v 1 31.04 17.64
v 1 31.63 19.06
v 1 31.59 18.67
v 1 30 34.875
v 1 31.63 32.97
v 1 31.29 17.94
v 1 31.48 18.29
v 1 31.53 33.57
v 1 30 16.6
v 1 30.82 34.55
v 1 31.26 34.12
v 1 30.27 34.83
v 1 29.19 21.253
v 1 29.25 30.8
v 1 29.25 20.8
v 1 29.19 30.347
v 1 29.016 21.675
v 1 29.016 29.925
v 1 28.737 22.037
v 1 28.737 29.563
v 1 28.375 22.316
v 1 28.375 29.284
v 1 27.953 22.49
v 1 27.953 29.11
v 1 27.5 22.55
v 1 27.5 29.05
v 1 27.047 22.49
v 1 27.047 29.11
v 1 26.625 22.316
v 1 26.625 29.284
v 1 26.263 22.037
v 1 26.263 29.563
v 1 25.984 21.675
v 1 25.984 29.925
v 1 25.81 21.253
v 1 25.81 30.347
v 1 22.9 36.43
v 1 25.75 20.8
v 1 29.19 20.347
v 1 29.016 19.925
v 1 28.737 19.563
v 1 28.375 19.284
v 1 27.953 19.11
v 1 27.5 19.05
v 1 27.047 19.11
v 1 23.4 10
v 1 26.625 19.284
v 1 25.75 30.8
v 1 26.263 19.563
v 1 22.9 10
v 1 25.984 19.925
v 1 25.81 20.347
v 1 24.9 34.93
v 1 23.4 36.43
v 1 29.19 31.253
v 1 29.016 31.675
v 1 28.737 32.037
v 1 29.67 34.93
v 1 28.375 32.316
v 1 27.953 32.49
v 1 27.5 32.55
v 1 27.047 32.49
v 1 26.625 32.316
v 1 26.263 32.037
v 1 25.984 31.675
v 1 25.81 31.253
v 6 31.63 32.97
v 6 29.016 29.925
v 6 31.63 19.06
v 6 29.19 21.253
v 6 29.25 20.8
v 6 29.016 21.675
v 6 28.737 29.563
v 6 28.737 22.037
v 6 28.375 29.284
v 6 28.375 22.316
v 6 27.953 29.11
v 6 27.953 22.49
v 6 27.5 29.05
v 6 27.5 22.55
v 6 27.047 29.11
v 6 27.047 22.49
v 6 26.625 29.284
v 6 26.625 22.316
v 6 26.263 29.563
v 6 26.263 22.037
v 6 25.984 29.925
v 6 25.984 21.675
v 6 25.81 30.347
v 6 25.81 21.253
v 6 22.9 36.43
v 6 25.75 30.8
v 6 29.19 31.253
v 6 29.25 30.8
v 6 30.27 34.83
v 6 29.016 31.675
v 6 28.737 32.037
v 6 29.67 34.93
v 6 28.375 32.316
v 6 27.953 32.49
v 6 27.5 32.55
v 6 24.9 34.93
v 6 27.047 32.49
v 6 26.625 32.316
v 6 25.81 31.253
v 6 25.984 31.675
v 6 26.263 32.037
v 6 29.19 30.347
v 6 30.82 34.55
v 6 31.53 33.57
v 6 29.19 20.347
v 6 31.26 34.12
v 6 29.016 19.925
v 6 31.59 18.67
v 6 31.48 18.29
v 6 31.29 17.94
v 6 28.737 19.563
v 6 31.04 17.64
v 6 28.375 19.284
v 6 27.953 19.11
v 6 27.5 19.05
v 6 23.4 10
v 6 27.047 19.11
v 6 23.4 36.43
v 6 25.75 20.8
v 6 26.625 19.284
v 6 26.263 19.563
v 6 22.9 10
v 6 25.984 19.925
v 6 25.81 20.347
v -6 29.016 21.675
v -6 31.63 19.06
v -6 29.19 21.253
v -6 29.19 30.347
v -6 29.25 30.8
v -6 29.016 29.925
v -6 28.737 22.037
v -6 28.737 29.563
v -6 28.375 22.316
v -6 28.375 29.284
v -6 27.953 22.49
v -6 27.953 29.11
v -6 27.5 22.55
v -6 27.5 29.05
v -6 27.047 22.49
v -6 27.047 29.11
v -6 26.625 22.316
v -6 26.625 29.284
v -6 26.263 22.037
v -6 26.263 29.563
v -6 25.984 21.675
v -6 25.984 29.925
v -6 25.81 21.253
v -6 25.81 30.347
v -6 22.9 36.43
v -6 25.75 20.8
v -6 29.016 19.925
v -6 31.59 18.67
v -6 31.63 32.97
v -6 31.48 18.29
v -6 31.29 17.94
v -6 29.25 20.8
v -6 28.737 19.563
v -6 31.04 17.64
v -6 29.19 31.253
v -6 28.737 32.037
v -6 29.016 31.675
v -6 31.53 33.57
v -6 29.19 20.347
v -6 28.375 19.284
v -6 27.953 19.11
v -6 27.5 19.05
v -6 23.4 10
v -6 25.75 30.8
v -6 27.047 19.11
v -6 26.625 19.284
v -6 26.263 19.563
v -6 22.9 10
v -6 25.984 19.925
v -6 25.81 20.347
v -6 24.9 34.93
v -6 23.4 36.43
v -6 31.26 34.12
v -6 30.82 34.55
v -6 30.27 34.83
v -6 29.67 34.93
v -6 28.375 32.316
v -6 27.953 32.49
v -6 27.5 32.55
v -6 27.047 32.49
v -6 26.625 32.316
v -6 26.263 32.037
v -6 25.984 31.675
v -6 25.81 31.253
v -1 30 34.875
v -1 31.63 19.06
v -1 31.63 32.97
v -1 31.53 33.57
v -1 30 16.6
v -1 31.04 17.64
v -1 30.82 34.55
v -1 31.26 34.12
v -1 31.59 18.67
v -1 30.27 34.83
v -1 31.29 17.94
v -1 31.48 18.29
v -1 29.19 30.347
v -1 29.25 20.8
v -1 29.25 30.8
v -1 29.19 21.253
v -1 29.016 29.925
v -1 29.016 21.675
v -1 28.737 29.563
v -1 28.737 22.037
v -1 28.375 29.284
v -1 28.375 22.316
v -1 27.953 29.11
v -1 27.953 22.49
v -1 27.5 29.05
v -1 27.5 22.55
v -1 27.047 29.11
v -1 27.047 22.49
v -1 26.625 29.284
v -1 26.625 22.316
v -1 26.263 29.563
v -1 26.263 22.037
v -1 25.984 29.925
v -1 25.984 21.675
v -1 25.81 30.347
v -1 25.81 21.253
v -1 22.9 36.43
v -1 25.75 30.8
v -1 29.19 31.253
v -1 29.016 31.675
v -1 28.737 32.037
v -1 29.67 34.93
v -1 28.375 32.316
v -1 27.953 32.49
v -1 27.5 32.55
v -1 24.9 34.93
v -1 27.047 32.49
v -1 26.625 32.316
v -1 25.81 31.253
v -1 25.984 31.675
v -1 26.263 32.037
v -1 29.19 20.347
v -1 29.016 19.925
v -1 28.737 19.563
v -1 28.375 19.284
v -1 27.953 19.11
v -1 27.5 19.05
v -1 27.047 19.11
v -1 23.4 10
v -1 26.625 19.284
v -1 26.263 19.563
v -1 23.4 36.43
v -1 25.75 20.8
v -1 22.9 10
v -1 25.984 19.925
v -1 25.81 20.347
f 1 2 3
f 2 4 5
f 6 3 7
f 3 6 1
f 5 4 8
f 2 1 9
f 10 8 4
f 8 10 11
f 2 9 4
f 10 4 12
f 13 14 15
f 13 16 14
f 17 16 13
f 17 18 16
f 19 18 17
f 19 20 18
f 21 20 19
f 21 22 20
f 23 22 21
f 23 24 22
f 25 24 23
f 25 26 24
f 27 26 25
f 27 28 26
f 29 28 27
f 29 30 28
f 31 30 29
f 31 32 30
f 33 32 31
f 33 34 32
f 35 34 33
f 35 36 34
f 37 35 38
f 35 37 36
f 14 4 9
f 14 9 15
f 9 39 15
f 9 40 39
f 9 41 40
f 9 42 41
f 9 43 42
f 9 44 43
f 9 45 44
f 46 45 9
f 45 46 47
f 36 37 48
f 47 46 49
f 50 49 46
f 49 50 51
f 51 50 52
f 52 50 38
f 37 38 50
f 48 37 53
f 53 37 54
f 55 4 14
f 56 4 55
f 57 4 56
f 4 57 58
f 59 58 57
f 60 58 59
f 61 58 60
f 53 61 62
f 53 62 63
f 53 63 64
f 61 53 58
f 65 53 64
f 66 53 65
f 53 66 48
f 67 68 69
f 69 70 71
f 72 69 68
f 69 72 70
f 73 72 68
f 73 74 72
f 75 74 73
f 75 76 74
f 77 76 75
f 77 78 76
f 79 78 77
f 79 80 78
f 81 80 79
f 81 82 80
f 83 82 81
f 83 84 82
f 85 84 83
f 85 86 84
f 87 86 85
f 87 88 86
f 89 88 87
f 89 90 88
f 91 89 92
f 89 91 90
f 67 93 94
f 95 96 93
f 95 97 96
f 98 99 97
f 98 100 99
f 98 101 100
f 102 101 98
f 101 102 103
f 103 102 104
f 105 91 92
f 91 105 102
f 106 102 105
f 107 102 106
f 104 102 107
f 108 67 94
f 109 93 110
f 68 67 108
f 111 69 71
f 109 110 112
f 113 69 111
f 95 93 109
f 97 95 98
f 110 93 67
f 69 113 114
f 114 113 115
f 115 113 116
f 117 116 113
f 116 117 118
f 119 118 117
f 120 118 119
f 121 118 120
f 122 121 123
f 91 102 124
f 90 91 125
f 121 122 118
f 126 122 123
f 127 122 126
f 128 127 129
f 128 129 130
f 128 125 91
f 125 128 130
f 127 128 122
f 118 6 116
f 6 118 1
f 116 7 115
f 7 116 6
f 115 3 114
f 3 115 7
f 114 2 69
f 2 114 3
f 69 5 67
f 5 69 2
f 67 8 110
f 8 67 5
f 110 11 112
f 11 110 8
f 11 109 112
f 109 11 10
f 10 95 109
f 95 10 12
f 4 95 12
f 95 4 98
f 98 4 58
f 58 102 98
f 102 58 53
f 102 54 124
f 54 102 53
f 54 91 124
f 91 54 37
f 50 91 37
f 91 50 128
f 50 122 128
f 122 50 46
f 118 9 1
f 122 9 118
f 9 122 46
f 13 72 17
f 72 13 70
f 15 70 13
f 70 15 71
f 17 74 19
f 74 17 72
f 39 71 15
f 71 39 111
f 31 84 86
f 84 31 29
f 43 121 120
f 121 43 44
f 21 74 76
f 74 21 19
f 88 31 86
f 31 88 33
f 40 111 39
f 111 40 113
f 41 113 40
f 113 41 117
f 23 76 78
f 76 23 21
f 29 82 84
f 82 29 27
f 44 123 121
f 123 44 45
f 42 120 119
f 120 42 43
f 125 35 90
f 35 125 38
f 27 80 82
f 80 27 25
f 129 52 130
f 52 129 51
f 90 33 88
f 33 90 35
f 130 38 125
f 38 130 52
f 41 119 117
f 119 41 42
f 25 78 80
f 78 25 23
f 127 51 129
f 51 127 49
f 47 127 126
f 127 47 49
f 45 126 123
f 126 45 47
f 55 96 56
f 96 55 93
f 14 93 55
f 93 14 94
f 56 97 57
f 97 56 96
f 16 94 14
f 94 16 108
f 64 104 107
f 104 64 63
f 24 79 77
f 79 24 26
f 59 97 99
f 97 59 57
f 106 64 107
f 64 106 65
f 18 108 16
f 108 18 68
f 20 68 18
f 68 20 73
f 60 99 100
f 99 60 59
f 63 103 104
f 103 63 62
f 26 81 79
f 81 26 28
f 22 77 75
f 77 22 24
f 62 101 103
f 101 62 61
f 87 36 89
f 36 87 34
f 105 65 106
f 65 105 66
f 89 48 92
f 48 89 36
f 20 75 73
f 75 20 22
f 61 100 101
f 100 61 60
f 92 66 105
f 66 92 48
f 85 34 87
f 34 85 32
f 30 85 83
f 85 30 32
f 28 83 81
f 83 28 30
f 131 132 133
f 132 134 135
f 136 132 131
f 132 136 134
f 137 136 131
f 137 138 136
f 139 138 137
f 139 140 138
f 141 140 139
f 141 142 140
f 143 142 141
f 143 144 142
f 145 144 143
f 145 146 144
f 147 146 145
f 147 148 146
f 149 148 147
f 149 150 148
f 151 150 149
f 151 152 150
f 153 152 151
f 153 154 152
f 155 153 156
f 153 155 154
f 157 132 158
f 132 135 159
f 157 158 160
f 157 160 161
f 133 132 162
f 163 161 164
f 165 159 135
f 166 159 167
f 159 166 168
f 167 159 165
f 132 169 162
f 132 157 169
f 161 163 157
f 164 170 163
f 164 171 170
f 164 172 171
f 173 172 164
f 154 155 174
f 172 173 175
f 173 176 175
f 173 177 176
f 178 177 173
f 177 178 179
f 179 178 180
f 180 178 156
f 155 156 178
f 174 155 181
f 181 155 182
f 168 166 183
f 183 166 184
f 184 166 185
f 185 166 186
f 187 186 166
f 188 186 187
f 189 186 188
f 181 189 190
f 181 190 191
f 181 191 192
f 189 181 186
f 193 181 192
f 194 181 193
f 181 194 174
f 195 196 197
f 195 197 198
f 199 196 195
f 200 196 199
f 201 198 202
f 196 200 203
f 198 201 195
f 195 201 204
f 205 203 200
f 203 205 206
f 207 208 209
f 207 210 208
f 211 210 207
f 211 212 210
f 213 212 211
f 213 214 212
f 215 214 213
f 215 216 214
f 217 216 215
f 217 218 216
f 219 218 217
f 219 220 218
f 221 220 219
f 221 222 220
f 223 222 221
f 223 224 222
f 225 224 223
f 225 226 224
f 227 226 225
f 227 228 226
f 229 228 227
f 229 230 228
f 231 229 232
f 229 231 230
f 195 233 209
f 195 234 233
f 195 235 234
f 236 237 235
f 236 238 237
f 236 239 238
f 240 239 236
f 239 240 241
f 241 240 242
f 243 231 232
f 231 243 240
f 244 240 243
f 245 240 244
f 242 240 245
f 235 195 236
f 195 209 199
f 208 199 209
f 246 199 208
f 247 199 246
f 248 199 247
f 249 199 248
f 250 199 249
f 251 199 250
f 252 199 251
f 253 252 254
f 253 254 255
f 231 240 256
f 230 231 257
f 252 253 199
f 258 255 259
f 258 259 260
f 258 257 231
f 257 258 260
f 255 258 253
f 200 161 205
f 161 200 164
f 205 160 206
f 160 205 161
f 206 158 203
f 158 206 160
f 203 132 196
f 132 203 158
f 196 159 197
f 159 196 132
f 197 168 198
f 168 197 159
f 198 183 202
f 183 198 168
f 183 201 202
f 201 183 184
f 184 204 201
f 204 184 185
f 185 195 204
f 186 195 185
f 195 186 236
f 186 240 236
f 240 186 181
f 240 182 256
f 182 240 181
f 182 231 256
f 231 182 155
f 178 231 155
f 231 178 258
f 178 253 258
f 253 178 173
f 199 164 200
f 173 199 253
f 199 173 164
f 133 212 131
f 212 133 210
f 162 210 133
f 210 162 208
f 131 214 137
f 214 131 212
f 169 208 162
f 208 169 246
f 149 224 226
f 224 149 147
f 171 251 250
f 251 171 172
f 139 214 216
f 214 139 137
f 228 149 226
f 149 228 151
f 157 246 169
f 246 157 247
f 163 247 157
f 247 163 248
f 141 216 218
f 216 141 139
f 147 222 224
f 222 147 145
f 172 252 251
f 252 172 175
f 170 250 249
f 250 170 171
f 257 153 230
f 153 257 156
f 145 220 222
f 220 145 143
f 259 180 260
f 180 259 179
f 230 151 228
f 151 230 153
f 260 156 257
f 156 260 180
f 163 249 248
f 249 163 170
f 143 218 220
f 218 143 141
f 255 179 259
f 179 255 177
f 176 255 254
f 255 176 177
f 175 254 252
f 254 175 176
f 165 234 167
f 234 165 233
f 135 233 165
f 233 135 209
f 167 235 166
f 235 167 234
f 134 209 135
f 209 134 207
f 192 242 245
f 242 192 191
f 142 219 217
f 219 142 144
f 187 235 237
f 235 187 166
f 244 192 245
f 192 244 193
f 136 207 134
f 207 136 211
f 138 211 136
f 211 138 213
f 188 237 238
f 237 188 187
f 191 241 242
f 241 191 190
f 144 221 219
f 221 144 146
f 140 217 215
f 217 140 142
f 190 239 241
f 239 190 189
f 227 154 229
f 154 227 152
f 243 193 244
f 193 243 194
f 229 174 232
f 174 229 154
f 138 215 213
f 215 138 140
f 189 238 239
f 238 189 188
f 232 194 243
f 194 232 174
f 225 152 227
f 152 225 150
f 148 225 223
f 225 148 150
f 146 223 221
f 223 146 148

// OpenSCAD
// Emmett-Delta 3D Printer 
// Based on Delta-Six Vertex Created by Sage Merrill
// Released on Openbuilds.com
// which was Based on orginal design by Johann C. Rocholl (Kossel Printer)
// License = Attribution Share Alike - CC BY SA

//Modified by David Bunch to handle 3/4" Electrical Conduit Pipe for Horizontals

//Modified 2/1/2016 to handle 4x 1/2" Electrical Conduit Pipes Vertically 

$vpt=[-4.8,-22,25.6];
$vpr =[55,0,71.2];
$vpd =435;
height = 40;
ExtendHt = 0;          //Extend height above main part
EMT_OD = 23.7;
EMT12_OD = 18.4;
EMT12_Rad = EMT12_OD / 2;
EMT_Rad = EMT_OD / 2;

Ht_Half = height / 2;
thickness = 5;

triangle_side = 316;
printer_height = 680;
delta_radius = 212.4;
Ht = 8;
M5 = 5.5;
//WireDia = 7;        //use minimum of 6mm for 4 conductor wire to go thru
Wire_Z_Height = 4;
M8 = 8.5;
M3 = 3.5;
PipeScrewDia = 4.5;   //Dia. of holes for Screws that mount EMT Pipe to Vertex
                       //Use 5.15 to 5.5 for M5, or 4.15 to 4.5 for M4

Pipe_Qty = 1;
//Pipe_Spacing = 30+6;     //gives 6mm clearance top & bottom of 86mm high vertex
                       //We Need 45mm to put Pipe Tensioning mount in vertically
Pipe_Spacing = -20;      //Use +20 for pipe at bottom & -20 for pipe even with top
ScrewSockSpace = 15;   //Spacing between t-Slot screw holes in corner
ScrewSockQty = 2;      //Number of t-slot screws on each side

MicroSwitchHole_Zoffset = 12;       //Z Offset for Micro Switch Holes
BaseThk = 10;
$fn=48;
PipeBaseThk=0;
IdlerMnt_X_Offset = 22;             //Idler Mount Bolt offset from center
                                    //Need at leas 20mm for 5mm thick plastic from Center hole
Idler_Move = 5;
Pipe_Z = EMT_Rad + (PipeBaseThk-2);
//Pipe_Z = 28.1;                      //Pipe will be level with top
Pipe_Z = height - 11.9;                       //Pipe will be level with bottom, so we can add corner part at top
UpHt = 6;
TotHt = PipeBaseThk + height + ExtendHt;
echo("TotHt = ", TotHt);
echo("Ht_Half + PipeBaseThk = ",Ht_Half + PipeBaseThk);
EarHt=.5;
EarsOn=0;       //Draw Ears, 1 = Yes, 0 = No

//Makes each segment about .7mm and even number of segments
EMT12OD_Res = (round(((EMT12_OD * 3.14)/4)/.7)*4);       //Resolution of Chamfers
echo("EMT12OD_Res = ",EMT12OD_Res);


module EMT12_4xCut()
{
    translate([-EMT12_Rad,EMT12_Rad,0])
    EMT12_1xPipe();
    translate([-EMT12_Rad,-EMT12_Rad,0])
    EMT12_1xPipe();
    translate([EMT12_Rad,EMT12_Rad,0])
    EMT12_1xPipe();
    translate([EMT12_Rad,-EMT12_Rad,0])
    EMT12_1xPipe();
    translate([-15.4,-15.4,0])
    cube([30.8,30.8,height+2]);
}
module EMT12_1xPipe(E_Ht = height+2)
{
    cylinder(d=EMT12_OD,h=E_Ht,$fn=EMT12OD_Res);
}
module EMT12_Pipes()
{
    translate([0,0,height - BaseThk])
    rotate([180,0,0])
    {
    translate([-EMT12_Rad,EMT12_Rad,0])
    EMT12_1xPipe(100);
    translate([-EMT12_Rad,-EMT12_Rad,0])
    EMT12_1xPipe(100);
    translate([EMT12_Rad,EMT12_Rad,0])
    EMT12_1xPipe(100);
    translate([EMT12_Rad,-EMT12_Rad,0])
    EMT12_1xPipe(100);
    }
}
//EMT12_Pipes();
module VertexTop_Outline()
{

	linear_extrude(height = height, center = false, convexity = 10)
	import("EMTH_EMTV_VertexTop.dxf", layer = "Outline");
}
module VertexTop_UpperFrameCut()
{
	linear_extrude(height = height+2, center = false, convexity = 10)
	import("EMTH_EMTV_VertexTop.dxf", layer = "UpperFrameCut");
}
module VertexTop_EMT12_FullCut()
{
    translate([0,0,0])
    EMT12_4xCut();
}

module VertexTop_EMT12_HalfCut()
{
    difference()
    {
        EMT12_4xCut();
        translate([-19.4,-5,-2])
        cube([38.8,10,height+4]);
        %EMT12_Pipes();
    }
}
module VertexTop_CornerCuts()
{
	linear_extrude(height = height+2, center = false, convexity = 10)
	import("EMTH_EMTV_VertexTop.dxf", layer = "CornerCuts");
}
module EMT_Nut()
{
    translate([1,-23.4,height-BaseThk])
    difference()
    {
//If Nut lock is not flush with outside pipe, try adjusting Pipe_Rad-1.3
        rotate([90,0,0])
        rotate([0,90,0])
        rotate([0,0,180])
        difference()
        {
            linear_extrude(height = 5, center = false, convexity = 10)polygon(points = 
            [[-0.5,0],[-0.5,26.43],[0,26.43],[1.5,24.93],[6.27,24.93],
            [6.87,24.83],[7.42,24.55],[7.86,24.12],[8.13,23.57],[8.23,22.97],
            [8.23,9.06],[8.19,8.67],[8.08,8.29],[7.89,7.94],[7.64,7.64],
            [0,0]]);
//            [[0,31.6],[7.64,23.96],[7.89,23.66],[8.08,23.31],[8.19,22.93],
//            [8.23,22.54],[8.23,9.06],[8.19,8.67],[8.08,8.29],[7.89,7.94],
//            [7.64,7.64],[0,0],[-0.5,0],[-0.5,31.6]]);
            translate([4.1,10.8,-1])
            cylinder(d=M3,h=8,$fn=24);
            translate([4.1,20.8,-1])
            cylinder(d=M3,h=8,$fn=24);
        }
    }
}
module EMT_NutsSide()
{
    EMT_Nut();
    translate([-7,0,0])
    EMT_Nut();
}
module Ears()
{
    linear_extrude(height = EarHt, center = false, convexity = 10)
	import("EMTH_EMTV_VertexTop.dxf", layer = "Ears");
}
module vertex()
{
		difference()
        {
            color("Blue")
            union()
            {
                translate([0,0,PipeBaseThk])
                VertexTop_Outline();
                EMT_NutsSide();
//                translate([0,0,18.4])
//                EMT_NutsSide();
            }

            Pipes();

            PipeScrewsBothSides();

            color("magenta")
            IdlerBoltHole();            //Hole for Idler bolt to extend
////Upper A Frame Hole (Large)
            translate([0,0,-1])
            VertexTop_UpperFrameCut();
//  // Angled Wire Runs on each side of Idler 
//
            WireRuns();
            WireTopEMT12();

            translate([0,0,-1])
            VertexTop_EMT12_HalfCut();

            translate([0,0,height-BaseThk])
            rotate([0,180,0])
            VertexTop_EMT12_FullCut();
// Corner Screw Sockets
            //CornerScrewSockets();

            IdlerCut();

            translate([0,-14+8.4,0])
            IdlerMntAdjustHoles();                  //Adjustment Slot holes for Idler Mount Plate
            translate([0,0,-1])
            VertexTop_CornerCuts();
//Cut 2mm slot for Pipe Tighten
            translate([-1,-30,-BaseThk])
            cube([2,18,height]);
//            translate([-1,-30,-1])
//            cube([2,18,height+2]);           //Uncomment if you want slit full height
		}
}
module MidTSlot_Open()
{
    linear_extrude(height = height + 20+ ExtendHt, center = false, convexity = 10)polygon(points = 
    [[-6.5,6.15],[-3.25,2.9],[3.25,2.9],[6.5,6.15],[6.5,9.2],
    [-6.5,9.2]]);
}

module IdlerBoltHole()
{
    translate([0,8.4,15])
    rotate([-90,0,0])
    {
        translate([0,-4,0])
        cylinder(d=10,h=20,$fn=36);
        translate([-5,-4,0])
        cube([10,8,20]);
        translate([0,4,0])
        cylinder(d=10,h=20,$fn=36);
    }
}
module IdlerCut()
{
    translate([0,34+8.4,18])
    rotate([-90,0,0])
    {
        color("cyan")
        cylinder(d=24,h=10,$fn=76);
        translate([-12,0,0])
        cube([24,20,10]);
    }
    RndCorner();
    mirror([1,0,0])
    RndCorner();
}
module RndCorner()
{
    translate([-4,34+8.4,22])
    rotate([-90,0,0])
    translate([-14,16,0])
    difference()
    {
        cylinder(d=18,h=10,$fn=24);
        translate([0,0,-1])
        cylinder(d=12,h=12,$fn=48);
        translate([-10,-20,-1])
        cube([20,20,12]);
        translate([-20,-10,-1])
        cube([20,20,12]);
    }
}
module IdlerMntAdjustHoles()
{ 
    translate([IdlerMnt_X_Offset,0,12])
    IdlerMntAdjustSlot();

    translate([-IdlerMnt_X_Offset,0,12])
    IdlerMntAdjustSlot();
}

module IdlerMntAdjustSlot()
{
    translate([0,58,3.5])
    rotate([90,0,0])
    union()
    {
        translate([0,Idler_Move,0])
        cylinder(d=5.5,h=10,$fn=24);
        translate([-2.75,-Idler_Move,0])
        cube([5.5,Idler_Move*2,10]);
        translate([0,-Idler_Move,0])
        cylinder(d=5.5,h=10,$fn=24);
    }
}

module WireTopEMT12()
{
    translate([-9.2,20.9,height])
    BotWireCut();
    translate([9.2,20.9,height])
    BotWireCut();

}
//We use 7mm for Diameter of Wire cut
module BotWireCut()
{
    rotate([-90,0,0])
    translate([0,0,-5.5])
    linear_extrude(height = 11, center = false, convexity = 10)polygon(points = 
    [[-3.5,3.5],[-3.5,1.5],[-5,0],[-5,-1],[5,-1],
    [5,0],[3.5,1.5],[3.5,3.5],[3.43,4.18],[3.23,4.84],
    [2.91,5.44],[2.47,5.97],[1.94,6.41],[1.34,6.73],[0.68,6.93],
    [0,7],[-0.68,6.93],[-1.34,6.73],[-1.94,6.41],[-2.47,5.97],
    [-2.91,5.44],[-3.23,4.84],[-3.43,4.18]]);
}
module WireRuns()
{
    color("red")
    translate([0,8.4,height -(2.8+6)])      //5mm puts hole just touching bottom
    {
        translate([-34,48,0])
        rotate([90,0,0])
        cylinder(d=5.5,h=14);
        translate([34,48,0])
        rotate([90,0,0])
        cylinder(d=5.5,h=14);
    }
}
module Pipe1x()
{
    translate([-46.3082,9.0793+8.4,0])
    rotate([0,0,30])
    rotate([-90,0,0])
    cylinder(d=EMT_OD,h=300,$fn=64);            //Cut Left Side opening for EMT pipe

    translate([46.3082,9.0793+8.4,0])
    rotate([0,0,-30])
    rotate([-90,0,0])
    cylinder(d=EMT_OD,h=300,$fn=64);            //Cut Right Side opening for EMT pipe
}
module Pipes()
{
    translate([0,0,Pipe_Z])
    {
        if (Pipe_Qty == 2)
        {
            Pipe1x();
            translate([0,0,Pipe_Spacing])
            Pipe1x();
        } else {
            Pipe1x();
            %Pipe1x();
        }
    }
}
module PipeScrewsBothSides()
{
    if (PipeBaseThk > 0)
    {
        PipeScrews();
        mirror([1,0,0])
        PipeScrews();
    } else {
        PipeScrews();
        mirror([1,0,0])
        PipeScrews();
    }
}
module PipeScrews()
{
    translate([0,0,Pipe_Z])
    {
        if (Pipe_Qty == 2)
        {
            PipeScrews1x();
            translate([0,0,Pipe_Spacing])
            PipeScrews1x();
        } else {
            PipeScrews1x();
            translate([0,0,Pipe_Spacing])
            PipeScrews1x();
        }
    }
}
module PipeScrews1x()
{
    translate([-62.2014,18.7073,0])
    rotate([0,0,30])
    rotate([0,90,0])
    cylinder(d=PipeScrewDia,h=32);

    translate([-80.7035,50.7538,0])
    rotate([0,0,30])
    rotate([0,90,0])
    cylinder(d=PipeScrewDia,h=32);
}
module OutScrewDriverHole()
{
    translate([0,0,-1])
    cylinder(d=M3,h=40);         //Screwdriver Access Hole
}

module CornerScrewSockets()
{
    translate([0,0,Ht_Half-10])
    {
        translate([0,-16,ScrewSockSpace])
        rotate([90, 0, 180])                    //Add a Hole in Center Top
        cylinder(d=M5,h=10,$fn=32);             //for connecting Tetrahedron top at corners
        for (z =[0:ScrewSockQty-1])
        {
            for (x = [-1,1])
            {
                translate([20*x,-16,z*ScrewSockSpace])
                rotate([90, 0, 180])
                color("red")
                cylinder(d=M5,h=40,$fn=32);         //Drill thru both sides of plastic
            }
        }
    }
}
module TimingBelt()
{
    color("black")
    import("TimingBelt_100mm.stl", convexity=3);
}
module LimitSwitch()
{
    color("red")
    import("LimitSwitch.stl", convexity=3);
}
module Idler_Cap()
{
    translate([0,0,15])
    import("Idler_2holeMount_44mmHoleSpacingAssembly_rev8_repaired.stl", convexity=3);
}
module Carriage()
{
    color("Orange")
    import("carriage_20x60_Rev20_repaired.stl", convexity=3);
}
module CarriageBack()
{
    rotate([0,0,180])
    color("Orange")
    import("BackPlate_20x60_Rev20_repaired.stl", convexity=3);
}
module LimitHolder()
{
    //rotate([0,0,180])
    color("Orange")
    import("Delta_EMT_LimitSwitchHolder_120deg_1x_rev2_repaired.stl", convexity=3);
}
module DrawFinal()
{
    translate([0,0,height])
    rotate([180,0,0])
    vertex();
}
if (EarsOn == 0)
{
    DrawFinal();
} else if (EarsOn == 1)
{
    DrawFinal();
    rotate([0,0,180])
    Ears();
}
